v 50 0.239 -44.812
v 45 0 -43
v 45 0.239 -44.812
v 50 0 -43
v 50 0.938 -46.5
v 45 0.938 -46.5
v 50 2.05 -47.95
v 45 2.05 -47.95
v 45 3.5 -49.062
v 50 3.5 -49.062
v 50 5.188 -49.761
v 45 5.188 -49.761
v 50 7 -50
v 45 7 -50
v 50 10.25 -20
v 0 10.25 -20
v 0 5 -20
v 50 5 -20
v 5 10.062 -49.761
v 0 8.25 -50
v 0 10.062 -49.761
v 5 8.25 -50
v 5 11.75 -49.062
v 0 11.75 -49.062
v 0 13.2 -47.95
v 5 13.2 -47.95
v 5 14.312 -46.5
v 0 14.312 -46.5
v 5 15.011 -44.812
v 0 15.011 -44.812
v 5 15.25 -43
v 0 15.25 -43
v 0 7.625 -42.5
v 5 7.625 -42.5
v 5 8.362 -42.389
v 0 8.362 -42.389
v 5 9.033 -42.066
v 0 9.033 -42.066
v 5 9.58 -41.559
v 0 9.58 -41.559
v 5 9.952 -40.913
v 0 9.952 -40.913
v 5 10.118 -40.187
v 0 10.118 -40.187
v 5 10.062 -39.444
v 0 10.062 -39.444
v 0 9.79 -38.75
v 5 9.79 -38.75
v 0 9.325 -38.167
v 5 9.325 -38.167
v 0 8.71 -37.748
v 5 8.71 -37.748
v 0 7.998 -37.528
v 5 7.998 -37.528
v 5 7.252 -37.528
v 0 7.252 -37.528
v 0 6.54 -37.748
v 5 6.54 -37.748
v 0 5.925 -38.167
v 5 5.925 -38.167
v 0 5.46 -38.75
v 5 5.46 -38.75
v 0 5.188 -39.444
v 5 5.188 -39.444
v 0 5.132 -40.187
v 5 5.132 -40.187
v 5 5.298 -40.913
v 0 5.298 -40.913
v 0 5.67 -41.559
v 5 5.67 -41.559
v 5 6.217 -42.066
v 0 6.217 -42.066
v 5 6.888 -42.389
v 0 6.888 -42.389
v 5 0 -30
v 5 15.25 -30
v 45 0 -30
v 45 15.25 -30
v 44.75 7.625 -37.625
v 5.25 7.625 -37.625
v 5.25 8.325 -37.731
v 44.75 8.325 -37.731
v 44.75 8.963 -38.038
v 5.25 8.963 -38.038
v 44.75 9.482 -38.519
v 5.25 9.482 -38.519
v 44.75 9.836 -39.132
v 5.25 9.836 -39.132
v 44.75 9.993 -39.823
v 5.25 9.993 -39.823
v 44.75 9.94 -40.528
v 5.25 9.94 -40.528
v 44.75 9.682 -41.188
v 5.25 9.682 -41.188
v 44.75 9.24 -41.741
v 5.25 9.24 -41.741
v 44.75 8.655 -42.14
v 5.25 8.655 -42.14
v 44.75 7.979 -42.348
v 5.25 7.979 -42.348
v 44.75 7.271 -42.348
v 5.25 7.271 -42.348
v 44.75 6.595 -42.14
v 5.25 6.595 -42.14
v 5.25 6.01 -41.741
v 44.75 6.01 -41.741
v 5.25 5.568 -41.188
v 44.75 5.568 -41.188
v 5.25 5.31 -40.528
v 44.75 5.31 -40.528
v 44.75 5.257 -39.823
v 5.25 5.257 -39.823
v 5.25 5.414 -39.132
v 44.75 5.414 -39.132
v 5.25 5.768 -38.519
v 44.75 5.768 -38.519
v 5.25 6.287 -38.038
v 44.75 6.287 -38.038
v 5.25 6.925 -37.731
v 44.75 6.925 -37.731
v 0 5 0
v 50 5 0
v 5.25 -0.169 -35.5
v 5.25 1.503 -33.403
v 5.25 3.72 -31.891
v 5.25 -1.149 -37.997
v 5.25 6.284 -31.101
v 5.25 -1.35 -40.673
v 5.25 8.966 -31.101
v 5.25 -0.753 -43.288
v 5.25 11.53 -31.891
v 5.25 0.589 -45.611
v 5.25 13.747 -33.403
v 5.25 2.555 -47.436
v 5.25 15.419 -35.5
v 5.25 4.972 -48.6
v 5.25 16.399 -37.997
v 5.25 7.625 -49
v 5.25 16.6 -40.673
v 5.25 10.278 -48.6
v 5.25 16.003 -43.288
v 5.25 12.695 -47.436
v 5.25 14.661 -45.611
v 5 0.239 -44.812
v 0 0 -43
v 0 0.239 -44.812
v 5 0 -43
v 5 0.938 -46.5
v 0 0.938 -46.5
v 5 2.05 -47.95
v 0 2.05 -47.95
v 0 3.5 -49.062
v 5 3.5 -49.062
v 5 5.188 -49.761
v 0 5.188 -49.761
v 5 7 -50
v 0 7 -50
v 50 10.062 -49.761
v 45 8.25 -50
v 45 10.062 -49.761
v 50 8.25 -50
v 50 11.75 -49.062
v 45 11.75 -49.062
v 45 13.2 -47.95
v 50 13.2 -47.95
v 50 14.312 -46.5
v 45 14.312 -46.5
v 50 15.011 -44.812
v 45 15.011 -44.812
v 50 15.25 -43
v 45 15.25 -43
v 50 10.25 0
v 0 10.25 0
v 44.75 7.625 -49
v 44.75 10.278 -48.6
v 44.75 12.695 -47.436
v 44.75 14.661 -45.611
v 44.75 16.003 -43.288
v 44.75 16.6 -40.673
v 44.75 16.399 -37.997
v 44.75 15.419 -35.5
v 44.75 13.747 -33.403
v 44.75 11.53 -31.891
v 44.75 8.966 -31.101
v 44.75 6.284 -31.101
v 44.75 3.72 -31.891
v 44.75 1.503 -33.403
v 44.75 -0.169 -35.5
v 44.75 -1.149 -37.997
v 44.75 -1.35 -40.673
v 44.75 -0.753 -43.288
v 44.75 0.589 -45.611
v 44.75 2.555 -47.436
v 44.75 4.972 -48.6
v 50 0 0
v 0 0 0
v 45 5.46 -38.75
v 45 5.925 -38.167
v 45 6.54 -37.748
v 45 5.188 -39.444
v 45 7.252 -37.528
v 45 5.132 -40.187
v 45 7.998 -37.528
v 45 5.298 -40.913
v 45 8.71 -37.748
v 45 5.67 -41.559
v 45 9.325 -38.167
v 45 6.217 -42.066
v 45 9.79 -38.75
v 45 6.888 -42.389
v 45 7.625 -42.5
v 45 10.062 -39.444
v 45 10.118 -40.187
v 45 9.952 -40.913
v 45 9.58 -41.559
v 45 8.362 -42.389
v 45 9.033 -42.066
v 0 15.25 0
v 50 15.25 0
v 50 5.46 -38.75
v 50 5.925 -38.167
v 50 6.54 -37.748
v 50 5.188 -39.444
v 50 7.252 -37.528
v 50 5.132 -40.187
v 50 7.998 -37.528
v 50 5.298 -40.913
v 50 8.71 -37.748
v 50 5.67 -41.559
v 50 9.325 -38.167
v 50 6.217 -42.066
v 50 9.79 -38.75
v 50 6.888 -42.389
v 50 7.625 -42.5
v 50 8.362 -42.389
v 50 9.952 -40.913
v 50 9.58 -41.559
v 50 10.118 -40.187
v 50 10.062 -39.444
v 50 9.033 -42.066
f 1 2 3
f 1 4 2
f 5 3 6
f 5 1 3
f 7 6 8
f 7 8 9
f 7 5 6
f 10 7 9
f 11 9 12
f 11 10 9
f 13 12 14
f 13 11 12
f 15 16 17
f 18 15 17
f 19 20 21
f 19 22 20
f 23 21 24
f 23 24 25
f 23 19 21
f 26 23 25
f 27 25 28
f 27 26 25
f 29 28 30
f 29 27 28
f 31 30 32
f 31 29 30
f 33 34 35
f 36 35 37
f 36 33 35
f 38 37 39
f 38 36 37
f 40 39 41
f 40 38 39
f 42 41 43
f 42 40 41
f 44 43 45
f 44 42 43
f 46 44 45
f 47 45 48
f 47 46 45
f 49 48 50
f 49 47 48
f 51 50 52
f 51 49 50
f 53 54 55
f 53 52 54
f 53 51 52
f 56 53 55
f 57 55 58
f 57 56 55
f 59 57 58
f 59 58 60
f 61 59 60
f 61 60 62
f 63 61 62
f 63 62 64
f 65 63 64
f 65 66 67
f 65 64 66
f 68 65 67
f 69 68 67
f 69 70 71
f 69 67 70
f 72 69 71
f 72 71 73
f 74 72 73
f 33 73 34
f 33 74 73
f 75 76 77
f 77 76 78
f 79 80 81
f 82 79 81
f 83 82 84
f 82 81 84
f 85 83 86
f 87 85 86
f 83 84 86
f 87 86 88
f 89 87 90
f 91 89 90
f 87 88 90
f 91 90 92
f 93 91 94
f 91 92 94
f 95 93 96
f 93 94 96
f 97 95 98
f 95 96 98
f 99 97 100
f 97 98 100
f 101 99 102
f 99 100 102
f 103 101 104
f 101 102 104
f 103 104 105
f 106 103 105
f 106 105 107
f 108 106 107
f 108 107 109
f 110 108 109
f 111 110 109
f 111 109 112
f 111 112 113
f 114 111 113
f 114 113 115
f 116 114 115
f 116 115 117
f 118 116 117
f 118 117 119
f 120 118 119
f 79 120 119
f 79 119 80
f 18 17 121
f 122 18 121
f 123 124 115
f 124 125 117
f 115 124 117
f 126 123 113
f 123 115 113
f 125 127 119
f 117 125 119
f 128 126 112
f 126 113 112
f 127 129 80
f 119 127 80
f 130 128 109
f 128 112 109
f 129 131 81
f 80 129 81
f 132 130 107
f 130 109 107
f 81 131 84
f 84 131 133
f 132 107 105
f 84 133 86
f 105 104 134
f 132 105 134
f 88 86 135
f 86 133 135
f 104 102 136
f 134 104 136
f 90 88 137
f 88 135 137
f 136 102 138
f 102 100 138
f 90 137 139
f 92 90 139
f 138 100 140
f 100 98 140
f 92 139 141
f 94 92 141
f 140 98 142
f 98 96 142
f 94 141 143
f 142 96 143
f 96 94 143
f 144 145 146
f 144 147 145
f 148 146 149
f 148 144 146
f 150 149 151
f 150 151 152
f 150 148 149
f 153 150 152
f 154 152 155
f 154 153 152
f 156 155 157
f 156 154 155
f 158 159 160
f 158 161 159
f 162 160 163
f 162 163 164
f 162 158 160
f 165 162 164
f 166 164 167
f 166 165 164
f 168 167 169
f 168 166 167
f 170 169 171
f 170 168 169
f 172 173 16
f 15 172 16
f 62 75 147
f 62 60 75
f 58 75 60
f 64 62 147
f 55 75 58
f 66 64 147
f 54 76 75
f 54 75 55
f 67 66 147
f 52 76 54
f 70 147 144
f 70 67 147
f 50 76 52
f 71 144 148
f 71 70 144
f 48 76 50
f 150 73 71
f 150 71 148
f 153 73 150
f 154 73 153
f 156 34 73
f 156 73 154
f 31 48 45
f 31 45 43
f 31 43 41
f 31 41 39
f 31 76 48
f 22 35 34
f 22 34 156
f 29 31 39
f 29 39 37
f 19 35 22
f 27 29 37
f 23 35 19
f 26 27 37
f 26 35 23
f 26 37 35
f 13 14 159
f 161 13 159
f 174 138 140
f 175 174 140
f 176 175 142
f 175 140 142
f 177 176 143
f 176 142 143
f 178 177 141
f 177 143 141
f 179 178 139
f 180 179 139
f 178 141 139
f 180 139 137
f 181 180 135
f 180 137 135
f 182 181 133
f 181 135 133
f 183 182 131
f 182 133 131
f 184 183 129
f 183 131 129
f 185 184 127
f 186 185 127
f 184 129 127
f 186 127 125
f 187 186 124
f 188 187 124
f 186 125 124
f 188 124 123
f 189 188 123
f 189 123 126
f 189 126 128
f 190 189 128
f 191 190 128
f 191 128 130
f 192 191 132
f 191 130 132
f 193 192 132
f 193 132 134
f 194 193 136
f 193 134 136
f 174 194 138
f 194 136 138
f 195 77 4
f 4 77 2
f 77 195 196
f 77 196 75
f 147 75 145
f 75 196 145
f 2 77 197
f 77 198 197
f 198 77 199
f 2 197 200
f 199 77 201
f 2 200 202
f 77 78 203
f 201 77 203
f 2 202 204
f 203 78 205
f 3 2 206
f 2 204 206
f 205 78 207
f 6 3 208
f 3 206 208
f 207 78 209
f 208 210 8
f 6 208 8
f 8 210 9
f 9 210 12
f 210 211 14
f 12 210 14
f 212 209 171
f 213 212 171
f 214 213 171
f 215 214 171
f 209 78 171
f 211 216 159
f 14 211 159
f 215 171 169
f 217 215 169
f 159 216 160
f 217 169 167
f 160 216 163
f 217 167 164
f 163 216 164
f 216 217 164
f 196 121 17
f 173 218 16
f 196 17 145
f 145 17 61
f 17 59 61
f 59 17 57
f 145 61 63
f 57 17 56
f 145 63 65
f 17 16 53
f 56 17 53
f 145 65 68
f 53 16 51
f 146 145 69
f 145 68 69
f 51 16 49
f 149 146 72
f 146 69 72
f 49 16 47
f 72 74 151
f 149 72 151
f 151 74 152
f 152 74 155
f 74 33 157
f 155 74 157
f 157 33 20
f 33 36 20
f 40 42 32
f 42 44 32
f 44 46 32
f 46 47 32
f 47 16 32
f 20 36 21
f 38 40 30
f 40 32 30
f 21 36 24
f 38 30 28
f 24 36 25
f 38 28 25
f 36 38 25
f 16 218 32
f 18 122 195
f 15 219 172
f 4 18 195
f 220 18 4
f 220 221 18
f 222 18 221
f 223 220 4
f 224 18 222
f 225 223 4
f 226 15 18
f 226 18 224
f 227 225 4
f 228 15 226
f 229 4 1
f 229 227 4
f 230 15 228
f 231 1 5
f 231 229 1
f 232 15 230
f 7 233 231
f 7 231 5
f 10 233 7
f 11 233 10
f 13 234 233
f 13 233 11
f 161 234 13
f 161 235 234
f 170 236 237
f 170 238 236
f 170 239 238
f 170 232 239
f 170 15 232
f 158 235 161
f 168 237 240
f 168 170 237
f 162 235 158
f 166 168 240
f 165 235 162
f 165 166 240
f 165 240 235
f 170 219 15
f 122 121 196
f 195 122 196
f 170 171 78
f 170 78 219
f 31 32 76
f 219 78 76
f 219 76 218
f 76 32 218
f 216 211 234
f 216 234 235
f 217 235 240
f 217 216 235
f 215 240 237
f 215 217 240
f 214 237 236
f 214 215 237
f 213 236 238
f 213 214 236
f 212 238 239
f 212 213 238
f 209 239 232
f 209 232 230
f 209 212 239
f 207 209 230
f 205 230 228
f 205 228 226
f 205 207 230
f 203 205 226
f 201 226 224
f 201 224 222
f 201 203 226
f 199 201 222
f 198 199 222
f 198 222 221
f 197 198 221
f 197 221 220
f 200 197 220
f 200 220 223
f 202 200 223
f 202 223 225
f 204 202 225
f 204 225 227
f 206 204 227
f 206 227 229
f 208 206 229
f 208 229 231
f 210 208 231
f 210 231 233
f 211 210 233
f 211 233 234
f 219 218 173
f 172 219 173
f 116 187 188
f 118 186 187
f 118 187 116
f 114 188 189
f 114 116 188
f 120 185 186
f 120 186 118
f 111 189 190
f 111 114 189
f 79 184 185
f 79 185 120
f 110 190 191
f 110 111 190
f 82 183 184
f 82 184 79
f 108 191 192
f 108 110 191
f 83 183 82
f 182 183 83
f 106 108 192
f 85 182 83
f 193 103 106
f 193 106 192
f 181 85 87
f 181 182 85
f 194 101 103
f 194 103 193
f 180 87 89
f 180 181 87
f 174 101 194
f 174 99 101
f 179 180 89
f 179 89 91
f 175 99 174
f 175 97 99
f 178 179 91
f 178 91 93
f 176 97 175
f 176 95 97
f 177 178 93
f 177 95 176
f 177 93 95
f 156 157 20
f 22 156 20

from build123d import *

# Parameters (mm, degrees)
SKETCH1_R           = 2.5
BOSS_EXTRUDE1_DEPTH = 50
SKETCH2_W           = 40
SKETCH2_H           = 20
CUT_EXTRUDE1_DEPTH  = 73.336453466
FILLET1_R           = 7
BOSS_EXTRUDE2_START = 0.25
SKETCH3_R           = 9
BOSS_EXTRUDE2_DEPTH = 39.5
SKETCH4_R           = 2.375
CUT_EXTRUDE2_DEPTH  = 70.129972696


with BuildPart() as part:
    # Sketch1 → Boss-Extrude1 (new body)
    with BuildSketch(Plane(origin=(0, 0, 0), x_dir=(0, 0, -1), z_dir=(1, 0, 0))):
        Polygon((0, 5), (0, 0), (50, 0), (50, 15.25), (0, 15.25), (0, 10.25), (20, 10.25), (20, 5), align=None)
        with Locations((40, 7.625)):
            Circle(SKETCH1_R, mode=Mode.SUBTRACT)
    extrude(amount=BOSS_EXTRUDE1_DEPTH)

    # Sketch2 → Cut-Extrude1 (cut, through all)
    with BuildSketch(Plane(origin=(0, 15.25, 0), x_dir=(1, 0, 0), z_dir=(0, 1, 0))):
        with Locations((25, 40)):
            Rectangle(SKETCH2_W, SKETCH2_H)
    extrude(amount=-CUT_EXTRUDE1_DEPTH, mode=Mode.SUBTRACT)

    # Fillet1
    fillet1_edges = [part.edges().sort_by_distance(p)[0] for p in [
        (47.5, 15.25, -50),
        (47.5, 0, -50),
        (2.5, 15.25, -50),
        (2.5, 0, -50),
    ]]
    fillet(fillet1_edges, radius=FILLET1_R)


with BuildPart() as body_2:
    # Sketch3 → Boss-Extrude2 (new body)
    with BuildSketch(Plane(origin=(5, 0, 0), x_dir=(0, 0, -1), z_dir=(1, 0, 0)).offset(BOSS_EXTRUDE2_START)):
        with Locations((40, 7.625)):
            Circle(SKETCH3_R)
    extrude(amount=BOSS_EXTRUDE2_DEPTH)

    # Sketch4 → Cut-Extrude2 (cut, through all)
    with BuildSketch(Plane.ZY.offset(-5.25)):
        with Locations((-40, 7.625)):
            Circle(SKETCH4_R)
    extrude(amount=-CUT_EXTRUDE2_DEPTH, mode=Mode.SUBTRACT)


solid = Compound([part.part, body_2.part])
